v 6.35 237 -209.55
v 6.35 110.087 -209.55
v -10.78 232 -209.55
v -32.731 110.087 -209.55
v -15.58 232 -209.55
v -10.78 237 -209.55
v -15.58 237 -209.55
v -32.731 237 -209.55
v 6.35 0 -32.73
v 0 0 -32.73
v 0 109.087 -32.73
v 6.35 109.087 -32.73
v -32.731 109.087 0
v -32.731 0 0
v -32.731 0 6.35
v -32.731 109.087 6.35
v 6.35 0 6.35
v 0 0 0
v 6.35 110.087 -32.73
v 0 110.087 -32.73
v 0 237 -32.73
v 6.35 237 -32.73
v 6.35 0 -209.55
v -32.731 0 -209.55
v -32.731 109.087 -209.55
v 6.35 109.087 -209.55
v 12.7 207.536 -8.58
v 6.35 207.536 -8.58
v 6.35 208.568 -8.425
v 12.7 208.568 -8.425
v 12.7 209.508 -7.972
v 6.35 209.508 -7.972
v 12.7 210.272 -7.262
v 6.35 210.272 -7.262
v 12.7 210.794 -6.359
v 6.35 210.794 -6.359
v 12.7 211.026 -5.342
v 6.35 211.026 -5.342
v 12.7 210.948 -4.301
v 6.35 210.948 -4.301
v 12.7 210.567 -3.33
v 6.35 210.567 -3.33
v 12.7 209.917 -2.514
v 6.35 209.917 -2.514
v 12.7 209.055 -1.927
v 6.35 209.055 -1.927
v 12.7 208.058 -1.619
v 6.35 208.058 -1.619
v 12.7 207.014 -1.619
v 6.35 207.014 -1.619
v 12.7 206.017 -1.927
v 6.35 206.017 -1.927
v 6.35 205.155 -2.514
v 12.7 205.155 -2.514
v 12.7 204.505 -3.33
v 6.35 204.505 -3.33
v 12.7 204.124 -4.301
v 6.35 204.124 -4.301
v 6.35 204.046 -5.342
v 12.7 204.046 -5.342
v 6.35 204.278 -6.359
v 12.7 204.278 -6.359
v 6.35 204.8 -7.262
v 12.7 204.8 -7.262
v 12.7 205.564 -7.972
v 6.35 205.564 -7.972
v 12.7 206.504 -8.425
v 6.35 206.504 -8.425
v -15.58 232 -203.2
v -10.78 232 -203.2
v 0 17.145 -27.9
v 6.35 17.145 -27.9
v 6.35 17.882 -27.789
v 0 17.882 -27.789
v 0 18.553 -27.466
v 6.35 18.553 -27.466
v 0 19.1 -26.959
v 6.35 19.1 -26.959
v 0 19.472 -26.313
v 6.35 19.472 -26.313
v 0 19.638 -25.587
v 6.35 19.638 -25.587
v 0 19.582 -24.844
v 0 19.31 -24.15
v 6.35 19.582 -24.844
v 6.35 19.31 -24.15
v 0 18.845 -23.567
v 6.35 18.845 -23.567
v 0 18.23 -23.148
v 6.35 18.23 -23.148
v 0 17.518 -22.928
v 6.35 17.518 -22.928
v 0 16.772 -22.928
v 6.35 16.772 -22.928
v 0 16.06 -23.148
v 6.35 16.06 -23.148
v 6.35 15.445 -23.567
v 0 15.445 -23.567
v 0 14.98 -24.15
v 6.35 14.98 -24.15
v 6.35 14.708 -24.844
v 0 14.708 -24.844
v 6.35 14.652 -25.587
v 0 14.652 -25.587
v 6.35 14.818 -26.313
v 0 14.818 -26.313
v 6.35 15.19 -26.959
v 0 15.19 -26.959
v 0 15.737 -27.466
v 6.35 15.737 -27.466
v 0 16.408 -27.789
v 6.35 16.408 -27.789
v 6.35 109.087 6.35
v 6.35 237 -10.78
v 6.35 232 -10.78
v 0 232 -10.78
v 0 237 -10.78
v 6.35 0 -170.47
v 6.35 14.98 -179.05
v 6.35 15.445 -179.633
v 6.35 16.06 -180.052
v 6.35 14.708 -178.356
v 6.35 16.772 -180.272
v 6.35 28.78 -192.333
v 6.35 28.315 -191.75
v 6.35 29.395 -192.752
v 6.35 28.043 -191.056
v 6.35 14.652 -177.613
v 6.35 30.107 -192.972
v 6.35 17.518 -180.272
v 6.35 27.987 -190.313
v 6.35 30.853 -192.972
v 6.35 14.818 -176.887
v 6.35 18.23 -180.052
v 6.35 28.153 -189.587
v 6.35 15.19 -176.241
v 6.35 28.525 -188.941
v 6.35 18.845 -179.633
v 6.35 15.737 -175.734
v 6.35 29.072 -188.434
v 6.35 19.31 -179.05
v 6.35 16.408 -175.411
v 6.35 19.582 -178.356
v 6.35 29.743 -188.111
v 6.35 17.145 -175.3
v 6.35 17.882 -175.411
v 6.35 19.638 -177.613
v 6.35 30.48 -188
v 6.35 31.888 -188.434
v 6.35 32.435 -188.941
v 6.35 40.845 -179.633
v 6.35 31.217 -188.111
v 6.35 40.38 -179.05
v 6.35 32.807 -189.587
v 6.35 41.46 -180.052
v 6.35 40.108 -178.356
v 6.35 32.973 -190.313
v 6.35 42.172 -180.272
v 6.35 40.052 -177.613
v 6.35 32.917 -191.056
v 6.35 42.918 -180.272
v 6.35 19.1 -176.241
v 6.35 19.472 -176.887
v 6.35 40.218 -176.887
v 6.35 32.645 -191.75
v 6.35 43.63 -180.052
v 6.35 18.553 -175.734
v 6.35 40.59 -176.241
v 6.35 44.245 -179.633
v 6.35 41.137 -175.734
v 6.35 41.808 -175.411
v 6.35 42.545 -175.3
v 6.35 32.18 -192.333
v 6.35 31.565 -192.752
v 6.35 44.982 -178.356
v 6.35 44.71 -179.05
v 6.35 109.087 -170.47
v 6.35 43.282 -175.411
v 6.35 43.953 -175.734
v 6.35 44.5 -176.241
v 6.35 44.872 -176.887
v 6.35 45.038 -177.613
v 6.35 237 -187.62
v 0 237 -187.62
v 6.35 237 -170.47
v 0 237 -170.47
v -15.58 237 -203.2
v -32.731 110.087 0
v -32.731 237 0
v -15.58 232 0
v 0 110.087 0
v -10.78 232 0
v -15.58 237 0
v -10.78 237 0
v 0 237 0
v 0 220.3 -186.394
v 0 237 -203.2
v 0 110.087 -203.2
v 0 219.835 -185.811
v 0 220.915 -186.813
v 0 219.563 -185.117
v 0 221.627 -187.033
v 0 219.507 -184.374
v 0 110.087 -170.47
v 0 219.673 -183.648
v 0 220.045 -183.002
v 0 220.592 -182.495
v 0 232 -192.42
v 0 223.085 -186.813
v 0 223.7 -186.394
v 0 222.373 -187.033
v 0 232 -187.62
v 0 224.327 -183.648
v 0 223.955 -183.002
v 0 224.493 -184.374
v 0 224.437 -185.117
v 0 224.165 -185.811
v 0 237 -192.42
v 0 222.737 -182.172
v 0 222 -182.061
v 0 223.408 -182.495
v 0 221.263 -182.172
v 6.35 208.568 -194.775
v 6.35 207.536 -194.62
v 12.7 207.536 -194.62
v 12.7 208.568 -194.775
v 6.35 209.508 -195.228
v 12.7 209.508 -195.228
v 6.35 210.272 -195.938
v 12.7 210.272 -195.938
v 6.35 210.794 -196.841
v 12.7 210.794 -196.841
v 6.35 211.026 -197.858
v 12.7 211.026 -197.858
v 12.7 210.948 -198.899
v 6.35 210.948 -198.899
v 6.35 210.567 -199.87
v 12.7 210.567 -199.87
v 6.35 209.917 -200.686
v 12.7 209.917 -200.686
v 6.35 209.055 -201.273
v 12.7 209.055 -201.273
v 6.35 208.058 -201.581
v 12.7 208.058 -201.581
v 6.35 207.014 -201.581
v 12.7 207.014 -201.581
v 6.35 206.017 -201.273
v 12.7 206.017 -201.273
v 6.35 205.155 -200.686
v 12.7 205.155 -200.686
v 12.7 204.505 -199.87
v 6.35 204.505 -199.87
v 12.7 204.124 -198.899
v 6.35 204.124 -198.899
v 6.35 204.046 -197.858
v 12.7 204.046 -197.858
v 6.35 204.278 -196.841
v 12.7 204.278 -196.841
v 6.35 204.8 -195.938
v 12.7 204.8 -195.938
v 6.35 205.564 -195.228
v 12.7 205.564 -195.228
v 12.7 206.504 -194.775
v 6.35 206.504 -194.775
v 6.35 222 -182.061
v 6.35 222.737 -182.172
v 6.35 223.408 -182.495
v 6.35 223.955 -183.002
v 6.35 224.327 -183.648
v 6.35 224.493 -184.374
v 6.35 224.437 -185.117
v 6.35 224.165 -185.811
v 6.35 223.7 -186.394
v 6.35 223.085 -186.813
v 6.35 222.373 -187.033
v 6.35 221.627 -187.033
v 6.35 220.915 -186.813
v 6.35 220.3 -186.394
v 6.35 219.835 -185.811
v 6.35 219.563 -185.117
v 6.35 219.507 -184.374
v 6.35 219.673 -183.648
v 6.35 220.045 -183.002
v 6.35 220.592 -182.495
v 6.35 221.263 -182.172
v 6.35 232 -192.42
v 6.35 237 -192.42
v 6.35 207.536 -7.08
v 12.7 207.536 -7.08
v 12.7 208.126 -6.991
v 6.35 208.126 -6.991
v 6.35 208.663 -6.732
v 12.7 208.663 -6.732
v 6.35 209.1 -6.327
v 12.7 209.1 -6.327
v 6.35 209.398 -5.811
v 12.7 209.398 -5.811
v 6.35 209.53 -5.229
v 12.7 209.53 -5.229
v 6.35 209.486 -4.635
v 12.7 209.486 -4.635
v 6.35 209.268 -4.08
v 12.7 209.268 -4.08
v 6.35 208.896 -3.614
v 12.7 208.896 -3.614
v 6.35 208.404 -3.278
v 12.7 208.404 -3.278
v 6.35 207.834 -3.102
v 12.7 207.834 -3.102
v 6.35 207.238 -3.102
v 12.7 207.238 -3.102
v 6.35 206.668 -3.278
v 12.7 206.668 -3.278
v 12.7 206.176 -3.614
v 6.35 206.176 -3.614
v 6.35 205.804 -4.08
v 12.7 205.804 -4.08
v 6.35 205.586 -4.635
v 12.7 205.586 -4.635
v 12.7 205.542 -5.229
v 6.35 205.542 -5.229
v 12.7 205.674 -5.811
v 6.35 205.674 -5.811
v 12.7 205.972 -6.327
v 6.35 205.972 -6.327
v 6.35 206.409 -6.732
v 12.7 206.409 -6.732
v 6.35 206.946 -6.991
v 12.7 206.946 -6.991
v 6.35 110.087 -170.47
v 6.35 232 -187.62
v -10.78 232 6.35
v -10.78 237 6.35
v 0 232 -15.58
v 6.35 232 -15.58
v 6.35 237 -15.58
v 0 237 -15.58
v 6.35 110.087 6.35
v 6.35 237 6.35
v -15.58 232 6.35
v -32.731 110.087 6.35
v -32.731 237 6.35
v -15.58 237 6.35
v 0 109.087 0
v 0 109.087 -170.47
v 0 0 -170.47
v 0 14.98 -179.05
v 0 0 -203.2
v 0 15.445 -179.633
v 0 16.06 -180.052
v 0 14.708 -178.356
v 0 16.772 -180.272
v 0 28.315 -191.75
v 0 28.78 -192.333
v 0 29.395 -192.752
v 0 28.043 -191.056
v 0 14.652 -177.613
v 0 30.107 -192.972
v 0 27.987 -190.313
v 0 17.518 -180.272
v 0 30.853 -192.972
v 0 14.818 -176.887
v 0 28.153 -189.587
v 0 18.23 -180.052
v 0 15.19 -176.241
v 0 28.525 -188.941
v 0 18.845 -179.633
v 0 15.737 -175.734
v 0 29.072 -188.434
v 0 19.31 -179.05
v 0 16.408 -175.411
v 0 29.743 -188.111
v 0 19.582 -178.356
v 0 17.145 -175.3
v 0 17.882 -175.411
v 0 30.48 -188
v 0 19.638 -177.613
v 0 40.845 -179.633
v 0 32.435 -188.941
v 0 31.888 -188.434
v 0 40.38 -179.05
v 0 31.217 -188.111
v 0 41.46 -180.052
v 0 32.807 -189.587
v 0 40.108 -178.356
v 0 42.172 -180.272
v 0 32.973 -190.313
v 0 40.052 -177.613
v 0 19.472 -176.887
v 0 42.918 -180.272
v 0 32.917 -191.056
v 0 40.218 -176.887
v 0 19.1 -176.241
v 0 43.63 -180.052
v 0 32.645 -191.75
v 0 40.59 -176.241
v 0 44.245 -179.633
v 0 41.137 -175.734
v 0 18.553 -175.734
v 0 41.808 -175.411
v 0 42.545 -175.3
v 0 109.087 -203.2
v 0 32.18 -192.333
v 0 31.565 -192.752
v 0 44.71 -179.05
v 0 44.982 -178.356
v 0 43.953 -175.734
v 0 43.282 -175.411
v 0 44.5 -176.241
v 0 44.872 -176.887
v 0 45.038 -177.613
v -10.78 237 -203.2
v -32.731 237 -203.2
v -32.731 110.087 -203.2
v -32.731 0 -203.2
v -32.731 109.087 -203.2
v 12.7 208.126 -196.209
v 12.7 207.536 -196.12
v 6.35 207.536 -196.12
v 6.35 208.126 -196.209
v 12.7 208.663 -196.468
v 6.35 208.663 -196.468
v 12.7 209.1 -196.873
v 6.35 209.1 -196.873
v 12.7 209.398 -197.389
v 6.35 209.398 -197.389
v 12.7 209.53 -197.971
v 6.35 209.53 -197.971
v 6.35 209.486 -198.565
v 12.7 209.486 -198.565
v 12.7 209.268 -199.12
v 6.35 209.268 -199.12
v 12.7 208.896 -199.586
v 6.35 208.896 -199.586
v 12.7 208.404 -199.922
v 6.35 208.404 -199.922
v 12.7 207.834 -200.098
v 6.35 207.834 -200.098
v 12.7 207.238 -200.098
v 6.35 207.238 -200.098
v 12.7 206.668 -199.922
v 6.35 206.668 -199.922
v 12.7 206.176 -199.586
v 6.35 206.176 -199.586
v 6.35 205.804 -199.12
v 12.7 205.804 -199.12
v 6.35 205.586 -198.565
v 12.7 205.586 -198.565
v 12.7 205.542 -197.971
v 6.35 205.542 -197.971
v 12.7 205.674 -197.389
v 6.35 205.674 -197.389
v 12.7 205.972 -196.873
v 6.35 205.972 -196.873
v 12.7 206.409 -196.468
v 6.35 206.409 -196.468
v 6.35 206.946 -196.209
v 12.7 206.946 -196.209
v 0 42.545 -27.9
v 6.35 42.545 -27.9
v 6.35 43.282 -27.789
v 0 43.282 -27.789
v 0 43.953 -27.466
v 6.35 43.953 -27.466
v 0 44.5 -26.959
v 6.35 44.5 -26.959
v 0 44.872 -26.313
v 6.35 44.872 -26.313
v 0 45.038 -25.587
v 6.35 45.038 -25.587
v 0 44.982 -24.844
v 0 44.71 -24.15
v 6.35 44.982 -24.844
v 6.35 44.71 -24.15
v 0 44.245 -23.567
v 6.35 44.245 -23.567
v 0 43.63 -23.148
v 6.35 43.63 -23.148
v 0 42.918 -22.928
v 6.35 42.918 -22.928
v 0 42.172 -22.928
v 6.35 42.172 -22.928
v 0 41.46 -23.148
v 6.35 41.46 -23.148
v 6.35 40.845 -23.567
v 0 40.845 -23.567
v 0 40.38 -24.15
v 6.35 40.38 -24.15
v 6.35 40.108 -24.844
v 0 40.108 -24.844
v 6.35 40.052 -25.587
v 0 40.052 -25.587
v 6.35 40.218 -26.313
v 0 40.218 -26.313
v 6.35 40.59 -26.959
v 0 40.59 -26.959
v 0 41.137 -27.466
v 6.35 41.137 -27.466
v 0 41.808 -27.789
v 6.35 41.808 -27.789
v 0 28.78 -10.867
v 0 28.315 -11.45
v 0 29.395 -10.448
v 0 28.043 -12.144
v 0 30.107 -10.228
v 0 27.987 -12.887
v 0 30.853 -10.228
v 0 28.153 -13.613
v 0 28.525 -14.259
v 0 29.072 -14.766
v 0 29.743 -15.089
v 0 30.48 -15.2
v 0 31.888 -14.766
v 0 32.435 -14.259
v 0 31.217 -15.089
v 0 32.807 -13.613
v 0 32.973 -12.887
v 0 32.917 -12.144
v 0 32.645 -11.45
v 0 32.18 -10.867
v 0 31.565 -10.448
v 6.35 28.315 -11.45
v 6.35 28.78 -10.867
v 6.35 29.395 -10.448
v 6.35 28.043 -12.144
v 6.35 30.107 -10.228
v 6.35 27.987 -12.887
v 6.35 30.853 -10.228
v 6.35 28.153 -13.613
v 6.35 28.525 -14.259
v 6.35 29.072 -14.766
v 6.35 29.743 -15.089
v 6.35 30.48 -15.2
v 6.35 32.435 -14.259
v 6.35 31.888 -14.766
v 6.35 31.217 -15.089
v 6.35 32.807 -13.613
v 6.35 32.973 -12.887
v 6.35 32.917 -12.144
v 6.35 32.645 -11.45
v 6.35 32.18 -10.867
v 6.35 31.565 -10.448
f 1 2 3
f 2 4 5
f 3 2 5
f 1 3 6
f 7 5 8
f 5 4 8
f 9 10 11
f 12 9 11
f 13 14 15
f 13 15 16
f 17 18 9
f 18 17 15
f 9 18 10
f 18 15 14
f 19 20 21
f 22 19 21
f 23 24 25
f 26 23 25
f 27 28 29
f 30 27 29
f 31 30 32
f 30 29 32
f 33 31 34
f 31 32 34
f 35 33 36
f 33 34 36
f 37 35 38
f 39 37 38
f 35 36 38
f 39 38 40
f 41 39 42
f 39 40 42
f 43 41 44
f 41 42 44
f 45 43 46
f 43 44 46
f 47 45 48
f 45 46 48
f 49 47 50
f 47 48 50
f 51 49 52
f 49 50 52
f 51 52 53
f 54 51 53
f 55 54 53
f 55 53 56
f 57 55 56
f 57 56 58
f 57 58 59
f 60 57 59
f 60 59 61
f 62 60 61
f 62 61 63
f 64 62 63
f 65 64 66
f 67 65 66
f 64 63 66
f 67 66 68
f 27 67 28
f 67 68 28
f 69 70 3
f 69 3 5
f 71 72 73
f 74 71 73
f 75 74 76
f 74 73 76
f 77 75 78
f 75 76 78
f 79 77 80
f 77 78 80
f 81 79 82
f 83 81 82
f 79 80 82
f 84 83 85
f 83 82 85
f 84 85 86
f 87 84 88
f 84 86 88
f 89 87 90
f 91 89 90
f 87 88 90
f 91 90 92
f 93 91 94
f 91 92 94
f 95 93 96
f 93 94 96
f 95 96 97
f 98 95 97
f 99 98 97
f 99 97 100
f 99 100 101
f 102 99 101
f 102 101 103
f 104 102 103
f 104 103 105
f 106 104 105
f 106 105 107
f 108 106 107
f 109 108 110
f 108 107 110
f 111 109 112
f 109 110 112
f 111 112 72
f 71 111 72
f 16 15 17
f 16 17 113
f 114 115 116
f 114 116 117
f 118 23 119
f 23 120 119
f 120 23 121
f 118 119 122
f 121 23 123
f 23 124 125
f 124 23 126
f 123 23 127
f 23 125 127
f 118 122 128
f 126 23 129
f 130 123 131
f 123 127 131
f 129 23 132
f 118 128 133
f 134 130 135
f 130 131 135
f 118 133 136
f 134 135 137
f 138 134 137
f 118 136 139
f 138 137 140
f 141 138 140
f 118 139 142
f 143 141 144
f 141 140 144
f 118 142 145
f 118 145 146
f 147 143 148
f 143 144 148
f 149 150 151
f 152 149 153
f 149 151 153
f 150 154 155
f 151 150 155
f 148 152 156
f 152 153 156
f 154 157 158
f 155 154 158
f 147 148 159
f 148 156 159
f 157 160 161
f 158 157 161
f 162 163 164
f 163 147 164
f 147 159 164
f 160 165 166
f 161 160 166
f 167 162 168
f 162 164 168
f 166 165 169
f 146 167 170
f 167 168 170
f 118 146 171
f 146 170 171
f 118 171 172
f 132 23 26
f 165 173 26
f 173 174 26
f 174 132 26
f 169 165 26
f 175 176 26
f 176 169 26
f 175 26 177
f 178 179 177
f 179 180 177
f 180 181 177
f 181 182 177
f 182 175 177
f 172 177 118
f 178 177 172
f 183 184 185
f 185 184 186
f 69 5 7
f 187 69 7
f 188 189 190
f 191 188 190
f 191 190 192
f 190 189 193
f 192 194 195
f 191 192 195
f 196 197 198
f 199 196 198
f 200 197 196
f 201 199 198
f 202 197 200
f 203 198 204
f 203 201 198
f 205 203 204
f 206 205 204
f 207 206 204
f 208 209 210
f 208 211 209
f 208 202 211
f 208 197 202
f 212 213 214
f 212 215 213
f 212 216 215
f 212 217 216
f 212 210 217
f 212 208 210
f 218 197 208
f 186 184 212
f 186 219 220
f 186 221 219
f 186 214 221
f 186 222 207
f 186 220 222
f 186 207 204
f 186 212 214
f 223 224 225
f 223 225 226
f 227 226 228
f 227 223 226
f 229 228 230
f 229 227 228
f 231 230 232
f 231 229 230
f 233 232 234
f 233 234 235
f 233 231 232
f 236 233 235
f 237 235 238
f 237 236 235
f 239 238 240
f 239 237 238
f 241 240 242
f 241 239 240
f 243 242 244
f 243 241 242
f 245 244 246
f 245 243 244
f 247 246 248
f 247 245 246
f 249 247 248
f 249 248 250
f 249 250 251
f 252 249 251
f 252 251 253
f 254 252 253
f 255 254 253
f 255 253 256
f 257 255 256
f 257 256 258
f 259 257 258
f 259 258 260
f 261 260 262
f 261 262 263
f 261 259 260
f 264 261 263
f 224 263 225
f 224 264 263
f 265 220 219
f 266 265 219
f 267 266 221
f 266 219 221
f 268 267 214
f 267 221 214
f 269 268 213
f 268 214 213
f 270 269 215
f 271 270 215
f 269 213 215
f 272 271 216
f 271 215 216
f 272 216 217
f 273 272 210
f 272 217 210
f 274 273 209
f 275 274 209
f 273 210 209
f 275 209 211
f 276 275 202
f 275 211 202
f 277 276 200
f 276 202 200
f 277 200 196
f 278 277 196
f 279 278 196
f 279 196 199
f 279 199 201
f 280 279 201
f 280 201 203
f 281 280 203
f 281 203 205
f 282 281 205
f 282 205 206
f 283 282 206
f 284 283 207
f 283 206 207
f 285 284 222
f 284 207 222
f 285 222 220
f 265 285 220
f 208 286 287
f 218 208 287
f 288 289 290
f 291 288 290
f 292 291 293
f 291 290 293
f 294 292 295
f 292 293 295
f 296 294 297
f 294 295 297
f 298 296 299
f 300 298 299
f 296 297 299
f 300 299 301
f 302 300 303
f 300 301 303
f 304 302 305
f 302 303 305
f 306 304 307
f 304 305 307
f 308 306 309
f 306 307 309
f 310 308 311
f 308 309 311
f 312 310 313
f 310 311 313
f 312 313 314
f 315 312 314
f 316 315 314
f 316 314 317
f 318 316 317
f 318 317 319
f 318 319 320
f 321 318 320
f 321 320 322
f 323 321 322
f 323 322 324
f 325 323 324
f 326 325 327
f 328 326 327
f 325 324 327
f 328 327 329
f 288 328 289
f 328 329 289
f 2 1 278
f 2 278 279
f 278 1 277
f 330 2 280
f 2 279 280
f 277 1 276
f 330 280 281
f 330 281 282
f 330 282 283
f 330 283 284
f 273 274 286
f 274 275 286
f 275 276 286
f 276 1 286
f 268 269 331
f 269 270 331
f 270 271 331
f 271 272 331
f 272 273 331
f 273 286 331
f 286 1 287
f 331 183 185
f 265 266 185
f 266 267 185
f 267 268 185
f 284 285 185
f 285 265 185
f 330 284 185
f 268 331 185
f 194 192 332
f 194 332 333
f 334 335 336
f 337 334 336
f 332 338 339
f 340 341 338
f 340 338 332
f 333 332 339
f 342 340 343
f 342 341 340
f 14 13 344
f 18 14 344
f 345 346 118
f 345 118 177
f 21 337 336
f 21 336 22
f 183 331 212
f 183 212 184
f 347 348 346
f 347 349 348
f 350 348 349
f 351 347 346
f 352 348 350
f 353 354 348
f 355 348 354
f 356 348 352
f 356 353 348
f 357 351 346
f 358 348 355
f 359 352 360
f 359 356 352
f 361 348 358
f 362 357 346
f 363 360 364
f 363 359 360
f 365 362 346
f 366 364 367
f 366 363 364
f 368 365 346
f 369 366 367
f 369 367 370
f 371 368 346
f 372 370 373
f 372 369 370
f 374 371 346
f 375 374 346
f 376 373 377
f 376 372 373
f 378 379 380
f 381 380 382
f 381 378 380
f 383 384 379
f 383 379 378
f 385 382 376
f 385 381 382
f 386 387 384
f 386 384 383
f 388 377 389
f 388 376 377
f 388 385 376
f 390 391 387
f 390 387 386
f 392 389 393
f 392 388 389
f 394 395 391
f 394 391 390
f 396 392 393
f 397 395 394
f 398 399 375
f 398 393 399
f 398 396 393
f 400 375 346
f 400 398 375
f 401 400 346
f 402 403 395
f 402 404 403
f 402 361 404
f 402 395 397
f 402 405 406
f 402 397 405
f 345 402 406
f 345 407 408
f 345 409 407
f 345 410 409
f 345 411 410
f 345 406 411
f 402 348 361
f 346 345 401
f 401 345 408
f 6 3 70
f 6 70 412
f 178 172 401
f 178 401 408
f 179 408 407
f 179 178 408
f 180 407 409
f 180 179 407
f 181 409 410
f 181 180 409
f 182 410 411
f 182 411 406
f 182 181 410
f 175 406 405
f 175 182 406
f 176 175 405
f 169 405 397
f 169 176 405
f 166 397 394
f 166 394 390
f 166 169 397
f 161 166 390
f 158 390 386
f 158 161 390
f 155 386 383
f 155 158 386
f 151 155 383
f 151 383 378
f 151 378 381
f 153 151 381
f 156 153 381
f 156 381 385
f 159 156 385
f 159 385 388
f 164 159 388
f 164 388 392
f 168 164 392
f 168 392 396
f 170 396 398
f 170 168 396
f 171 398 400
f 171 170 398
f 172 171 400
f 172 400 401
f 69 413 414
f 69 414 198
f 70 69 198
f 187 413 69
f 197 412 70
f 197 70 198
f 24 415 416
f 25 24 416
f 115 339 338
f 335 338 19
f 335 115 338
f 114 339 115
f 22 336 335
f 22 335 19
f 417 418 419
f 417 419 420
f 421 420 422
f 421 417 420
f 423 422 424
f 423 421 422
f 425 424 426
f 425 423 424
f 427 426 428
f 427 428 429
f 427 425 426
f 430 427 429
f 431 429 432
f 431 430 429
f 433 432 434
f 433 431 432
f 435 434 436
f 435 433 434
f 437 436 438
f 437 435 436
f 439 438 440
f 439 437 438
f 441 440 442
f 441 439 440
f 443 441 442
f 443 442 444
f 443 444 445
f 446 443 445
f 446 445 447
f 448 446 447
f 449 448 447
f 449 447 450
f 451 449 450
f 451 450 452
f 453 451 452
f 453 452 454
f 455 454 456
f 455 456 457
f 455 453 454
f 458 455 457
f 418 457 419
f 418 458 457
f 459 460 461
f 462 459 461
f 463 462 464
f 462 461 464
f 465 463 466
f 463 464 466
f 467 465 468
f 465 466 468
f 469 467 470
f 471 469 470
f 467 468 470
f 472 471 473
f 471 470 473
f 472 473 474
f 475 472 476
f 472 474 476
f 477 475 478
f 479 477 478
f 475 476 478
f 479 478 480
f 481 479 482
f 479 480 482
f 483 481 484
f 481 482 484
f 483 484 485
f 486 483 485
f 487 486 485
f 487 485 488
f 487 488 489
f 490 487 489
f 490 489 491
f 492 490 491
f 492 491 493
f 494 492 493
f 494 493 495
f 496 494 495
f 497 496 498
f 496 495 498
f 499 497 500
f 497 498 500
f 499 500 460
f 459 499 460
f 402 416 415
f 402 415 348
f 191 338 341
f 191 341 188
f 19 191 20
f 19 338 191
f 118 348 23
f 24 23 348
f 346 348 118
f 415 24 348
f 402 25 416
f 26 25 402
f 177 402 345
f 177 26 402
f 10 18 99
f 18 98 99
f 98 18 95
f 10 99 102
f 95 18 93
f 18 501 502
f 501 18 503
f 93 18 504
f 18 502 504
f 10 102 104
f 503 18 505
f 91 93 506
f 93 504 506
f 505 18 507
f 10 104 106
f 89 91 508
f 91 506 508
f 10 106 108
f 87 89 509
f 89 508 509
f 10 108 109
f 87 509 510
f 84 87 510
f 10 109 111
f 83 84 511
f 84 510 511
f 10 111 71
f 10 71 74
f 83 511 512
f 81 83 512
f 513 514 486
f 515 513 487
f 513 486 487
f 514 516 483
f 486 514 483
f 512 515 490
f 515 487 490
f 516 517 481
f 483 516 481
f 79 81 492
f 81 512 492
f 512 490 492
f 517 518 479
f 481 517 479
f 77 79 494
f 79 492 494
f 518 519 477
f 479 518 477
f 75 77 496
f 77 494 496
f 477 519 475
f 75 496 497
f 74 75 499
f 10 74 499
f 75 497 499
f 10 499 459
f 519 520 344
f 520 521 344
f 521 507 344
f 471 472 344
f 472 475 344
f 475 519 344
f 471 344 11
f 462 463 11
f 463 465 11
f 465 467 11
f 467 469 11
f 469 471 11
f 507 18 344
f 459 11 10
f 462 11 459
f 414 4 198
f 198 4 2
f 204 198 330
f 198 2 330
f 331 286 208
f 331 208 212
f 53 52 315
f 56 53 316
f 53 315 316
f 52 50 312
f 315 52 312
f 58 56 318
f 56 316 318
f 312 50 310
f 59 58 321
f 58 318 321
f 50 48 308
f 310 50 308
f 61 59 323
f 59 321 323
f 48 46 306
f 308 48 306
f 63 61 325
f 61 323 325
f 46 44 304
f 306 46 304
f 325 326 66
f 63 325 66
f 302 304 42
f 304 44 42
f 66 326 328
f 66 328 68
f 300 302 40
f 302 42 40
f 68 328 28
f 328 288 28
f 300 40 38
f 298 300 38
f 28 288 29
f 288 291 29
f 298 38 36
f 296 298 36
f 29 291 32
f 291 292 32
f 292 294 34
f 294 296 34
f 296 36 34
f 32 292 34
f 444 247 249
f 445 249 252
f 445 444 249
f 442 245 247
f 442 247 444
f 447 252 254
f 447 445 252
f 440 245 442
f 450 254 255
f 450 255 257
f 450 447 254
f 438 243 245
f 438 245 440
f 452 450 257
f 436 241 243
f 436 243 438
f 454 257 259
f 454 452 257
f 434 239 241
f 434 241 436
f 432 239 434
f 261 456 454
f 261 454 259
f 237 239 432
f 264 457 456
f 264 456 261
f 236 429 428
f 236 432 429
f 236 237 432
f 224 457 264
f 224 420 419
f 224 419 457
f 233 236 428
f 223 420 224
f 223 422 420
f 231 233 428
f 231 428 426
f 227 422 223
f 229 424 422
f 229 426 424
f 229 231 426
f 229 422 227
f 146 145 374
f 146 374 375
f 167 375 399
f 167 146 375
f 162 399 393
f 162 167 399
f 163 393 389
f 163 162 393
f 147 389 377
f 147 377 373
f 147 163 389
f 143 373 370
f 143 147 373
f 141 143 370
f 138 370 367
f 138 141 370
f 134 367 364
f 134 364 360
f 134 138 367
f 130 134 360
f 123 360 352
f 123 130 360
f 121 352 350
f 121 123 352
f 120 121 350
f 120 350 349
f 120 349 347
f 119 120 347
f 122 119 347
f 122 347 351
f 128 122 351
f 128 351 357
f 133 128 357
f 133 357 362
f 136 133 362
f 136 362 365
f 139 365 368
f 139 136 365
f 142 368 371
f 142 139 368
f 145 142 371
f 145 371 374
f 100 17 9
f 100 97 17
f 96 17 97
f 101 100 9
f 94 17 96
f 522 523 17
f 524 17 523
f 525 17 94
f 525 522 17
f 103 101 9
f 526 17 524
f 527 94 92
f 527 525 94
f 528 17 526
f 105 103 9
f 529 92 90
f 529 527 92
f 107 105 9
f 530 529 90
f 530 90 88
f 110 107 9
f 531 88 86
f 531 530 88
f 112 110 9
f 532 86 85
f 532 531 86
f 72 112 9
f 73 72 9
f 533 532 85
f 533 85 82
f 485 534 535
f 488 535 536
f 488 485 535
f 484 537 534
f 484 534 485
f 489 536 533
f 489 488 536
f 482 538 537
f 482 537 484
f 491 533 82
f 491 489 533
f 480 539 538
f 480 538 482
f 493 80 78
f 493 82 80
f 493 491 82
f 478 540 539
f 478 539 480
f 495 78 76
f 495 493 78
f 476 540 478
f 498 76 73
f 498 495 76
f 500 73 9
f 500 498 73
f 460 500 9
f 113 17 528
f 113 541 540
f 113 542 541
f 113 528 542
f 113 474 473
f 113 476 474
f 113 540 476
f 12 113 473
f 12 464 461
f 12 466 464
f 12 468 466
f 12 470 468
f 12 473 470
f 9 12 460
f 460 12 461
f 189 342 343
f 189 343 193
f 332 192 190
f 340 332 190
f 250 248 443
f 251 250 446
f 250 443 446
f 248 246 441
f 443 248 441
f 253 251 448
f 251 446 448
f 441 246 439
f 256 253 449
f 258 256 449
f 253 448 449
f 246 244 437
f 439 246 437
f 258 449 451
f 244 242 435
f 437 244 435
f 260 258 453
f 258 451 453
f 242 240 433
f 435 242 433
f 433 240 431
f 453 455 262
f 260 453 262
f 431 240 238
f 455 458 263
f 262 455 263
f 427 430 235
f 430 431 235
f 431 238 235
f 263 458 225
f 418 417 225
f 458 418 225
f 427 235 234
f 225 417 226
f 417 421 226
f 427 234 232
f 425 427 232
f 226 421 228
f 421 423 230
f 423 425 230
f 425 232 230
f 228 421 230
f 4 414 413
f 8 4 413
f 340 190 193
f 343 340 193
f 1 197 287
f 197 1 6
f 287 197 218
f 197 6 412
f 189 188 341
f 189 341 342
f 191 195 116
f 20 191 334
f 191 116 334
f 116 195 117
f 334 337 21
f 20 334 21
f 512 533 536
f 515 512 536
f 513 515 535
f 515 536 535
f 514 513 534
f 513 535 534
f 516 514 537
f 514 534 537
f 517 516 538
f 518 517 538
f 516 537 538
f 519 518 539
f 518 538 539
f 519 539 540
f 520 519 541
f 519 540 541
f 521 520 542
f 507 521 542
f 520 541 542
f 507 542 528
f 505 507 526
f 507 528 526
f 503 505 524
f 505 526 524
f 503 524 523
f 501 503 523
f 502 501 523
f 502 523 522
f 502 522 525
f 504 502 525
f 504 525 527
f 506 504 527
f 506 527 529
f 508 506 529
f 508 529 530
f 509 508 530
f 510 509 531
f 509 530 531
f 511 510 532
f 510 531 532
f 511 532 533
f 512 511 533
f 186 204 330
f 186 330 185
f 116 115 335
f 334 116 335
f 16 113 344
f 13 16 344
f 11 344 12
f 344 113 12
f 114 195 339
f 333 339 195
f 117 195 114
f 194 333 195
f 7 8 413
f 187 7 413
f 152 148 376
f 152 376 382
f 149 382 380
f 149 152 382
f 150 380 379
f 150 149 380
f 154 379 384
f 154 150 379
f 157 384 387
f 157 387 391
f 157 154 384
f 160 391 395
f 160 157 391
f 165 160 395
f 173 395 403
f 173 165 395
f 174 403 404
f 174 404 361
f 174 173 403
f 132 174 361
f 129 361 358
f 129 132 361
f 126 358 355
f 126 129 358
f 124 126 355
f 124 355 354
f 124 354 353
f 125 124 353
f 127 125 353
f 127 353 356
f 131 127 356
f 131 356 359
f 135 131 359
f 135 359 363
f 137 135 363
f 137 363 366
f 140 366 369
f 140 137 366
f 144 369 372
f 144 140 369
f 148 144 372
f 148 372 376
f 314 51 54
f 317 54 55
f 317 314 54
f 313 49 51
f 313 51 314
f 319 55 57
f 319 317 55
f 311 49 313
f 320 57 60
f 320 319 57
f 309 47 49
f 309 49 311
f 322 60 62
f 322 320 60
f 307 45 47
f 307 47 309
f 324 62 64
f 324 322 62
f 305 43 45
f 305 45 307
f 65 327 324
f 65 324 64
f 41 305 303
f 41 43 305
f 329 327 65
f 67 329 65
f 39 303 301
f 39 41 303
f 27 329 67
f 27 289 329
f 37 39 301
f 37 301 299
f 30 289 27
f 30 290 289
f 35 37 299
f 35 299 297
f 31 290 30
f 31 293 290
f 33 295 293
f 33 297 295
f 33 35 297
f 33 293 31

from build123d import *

# Parameters (mm, degrees)
SKETCH1_W                   = 32.730904613
SKETCH1_H                   = 237
BOSS_EXTRUDE1_DEPTH         = 6.35
SKETCH2_W                   = 39.08
SKETCH2_H                   = 237
BOSS_EXTRUDE3_DEPTH         = 6.35
SKETCH27_W                  = 4.8
SKETCH27_H                  = 5
LOCKING_MECHANISM_CUT_DEPTH = 6.35
SKETCH28_R                  = 2.5
BRACKET_BOLT_HOLES_DEPTH    = 6.35
F_1_MM_SPLIT_REACH          = 244.42
SKETCH29_W                  = 39.08
SKETCH29_H                  = 1
SKETCH32_R                  = 3.5
LOCKING_MOUNT_DEPTH         = 6.35
SKETCH33_R                  = 2
M4_SCREW_HOLE_DEPTH         = 6.35
SKETCH35_R                  = 2.5
CUT_EXTRUDE2_DEPTH          = 6.35


with BuildPart() as part:
    # Sketch1 → Boss-Extrude1 (new body)
    with BuildSketch(Plane.XY):
        with Locations((-16.365452306, 118.5)):
            Rectangle(SKETCH1_W, SKETCH1_H)
    extrude(amount=BOSS_EXTRUDE1_DEPTH)

    # Sketch2 → Boss-Extrude3 (add)
    with BuildSketch(Plane(origin=(0, 0, 0), x_dir=(0, 0, -1), z_dir=(1, 0, 0))):
        with Locations((13.19, 118.5)):
            Rectangle(SKETCH2_W, SKETCH2_H)
    extrude(amount=BOSS_EXTRUDE3_DEPTH)

    # Sketch27 → Locking_Mechanism_Cut (cut)
    with BuildSketch(Plane(origin=(6.35, 0, 0), x_dir=(0, 0, -1), z_dir=(1, 0, 0))):
        with Locations((13.180415796, 234.5)):
            Rectangle(SKETCH27_W, SKETCH27_H)
    locking_mechanism_cut = extrude(amount=-LOCKING_MECHANISM_CUT_DEPTH, mode=Mode.SUBTRACT)

    # Sketch28 → Bracket Bolt Holes (cut)
    with BuildSketch(Plane(origin=(6.35, 0, 0), x_dir=(0, 0, -1), z_dir=(1, 0, 0))):
        with Locations((25.4, 42.545)):
            Circle(SKETCH28_R)
        with Locations((25.4, 17.145)):
            Circle(SKETCH28_R)
        with Locations((12.7, 30.48)):
            Circle(SKETCH28_R)
    extrude(amount=-BRACKET_BOLT_HOLES_DEPTH, mode=Mode.SUBTRACT)

    # 1 mm split: up to this face of the body (flat: up to its plane)
    f_1_mm_split_end = Plane(part.part.faces().sort_by_distance((-32.730904613, 118.5, 3.175))[0])
    # Sketch29 → 1 mm split (cut, up to the picked face)
    with BuildSketch(Plane(origin=(6.35, 0, 0), x_dir=(0, 0, -1), z_dir=(1, 0, 0)), mode=Mode.PRIVATE) as f_1_mm_split_sk1:
        with Locations((13.19, 109.586886099)):
            Rectangle(SKETCH29_W, SKETCH29_H)
    f_1_mm_split_tool1 = split(extrude(f_1_mm_split_sk1.sketch, amount=-F_1_MM_SPLIT_REACH, mode=Mode.PRIVATE), bisect_by=f_1_mm_split_end, keep=Keep.BOTH, mode=Mode.PRIVATE)
    add(f_1_mm_split_tool1.solids().sort_by(Axis((6.35, 109.586886, -13.19), (-1, 0, 0)))[0], mode=Mode.SUBTRACT)


with BuildPart() as f_1_mm_split_piece_1:
    # of the separate pieces the step leaves, piece 1, a body of its own (f_1_mm_split_pieces)
    add(part.part.solids().sort_by_distance((-32.730904613, 110.086886099, 0))[0])

    # LockingMechanismMirror: Locking_Mechanism_Cut across plane
    add(locking_mechanism_cut.mirror(Plane(origin=(0, 0, 0), x_dir=(0.7071067811865465, 0, 0.7071067811865486), z_dir=(0.7071067811865488, 0, -0.7071067811865464))), mode=Mode.SUBTRACT)


with BuildPart() as f_1_mm_split_piece_2:
    # of the separate pieces the step leaves, piece 2, a body of its own (f_1_mm_split_pieces)
    add(part.part.solids().sort_by_distance((-32.730904613, 0, 0))[0])


with BuildPart() as body_3:
    # Sketch32 → Locking Mount (new body)
    with BuildSketch(Plane(origin=(6.35, 0, 0), x_dir=(0, 0, -1), z_dir=(1, 0, 0))):
        with Locations((5.08, 207.536)):
            Circle(SKETCH32_R)
    extrude(amount=LOCKING_MOUNT_DEPTH)

    # Sketch33 → M4 Screw Hole (cut)
    with BuildSketch(Plane(origin=(12.7, 0, 0), x_dir=(0, 0, -1), z_dir=(1, 0, 0))):
        with Locations((5.08, 207.536)):
            Circle(SKETCH33_R)
    extrude(amount=-M4_SCREW_HOLE_DEPTH, mode=Mode.SUBTRACT)


with BuildPart() as body_4:
    # Mirror2: mirrored copy
    add(f_1_mm_split_piece_1.part.mirror(Plane(origin=(0, 0, -101.6), x_dir=(1, 0, 0), z_dir=(0, 0, -1))))

    # Sketch35 → Cut-Extrude2 (cut)
    with BuildSketch(Plane.ZY):
        with Locations((-184.560987757, 222)):
            Circle(SKETCH35_R)
    extrude(amount=-CUT_EXTRUDE2_DEPTH, mode=Mode.SUBTRACT)


with BuildPart() as body_5:
    # Mirror2 2: mirrored copy
    add(f_1_mm_split_piece_2.part.mirror(Plane(origin=(0, 0, -101.6), x_dir=(1, 0, 0), z_dir=(0, 0, -1))))


with BuildPart() as body_6:
    # Mirror2 3: mirrored copy
    add(body_3.part.mirror(Plane(origin=(0, 0, -101.6), x_dir=(1, 0, 0), z_dir=(0, 0, -1))))


solid = Compound([f_1_mm_split_piece_1.part, f_1_mm_split_piece_2.part, body_3.part, body_4.part, body_5.part, body_6.part])
